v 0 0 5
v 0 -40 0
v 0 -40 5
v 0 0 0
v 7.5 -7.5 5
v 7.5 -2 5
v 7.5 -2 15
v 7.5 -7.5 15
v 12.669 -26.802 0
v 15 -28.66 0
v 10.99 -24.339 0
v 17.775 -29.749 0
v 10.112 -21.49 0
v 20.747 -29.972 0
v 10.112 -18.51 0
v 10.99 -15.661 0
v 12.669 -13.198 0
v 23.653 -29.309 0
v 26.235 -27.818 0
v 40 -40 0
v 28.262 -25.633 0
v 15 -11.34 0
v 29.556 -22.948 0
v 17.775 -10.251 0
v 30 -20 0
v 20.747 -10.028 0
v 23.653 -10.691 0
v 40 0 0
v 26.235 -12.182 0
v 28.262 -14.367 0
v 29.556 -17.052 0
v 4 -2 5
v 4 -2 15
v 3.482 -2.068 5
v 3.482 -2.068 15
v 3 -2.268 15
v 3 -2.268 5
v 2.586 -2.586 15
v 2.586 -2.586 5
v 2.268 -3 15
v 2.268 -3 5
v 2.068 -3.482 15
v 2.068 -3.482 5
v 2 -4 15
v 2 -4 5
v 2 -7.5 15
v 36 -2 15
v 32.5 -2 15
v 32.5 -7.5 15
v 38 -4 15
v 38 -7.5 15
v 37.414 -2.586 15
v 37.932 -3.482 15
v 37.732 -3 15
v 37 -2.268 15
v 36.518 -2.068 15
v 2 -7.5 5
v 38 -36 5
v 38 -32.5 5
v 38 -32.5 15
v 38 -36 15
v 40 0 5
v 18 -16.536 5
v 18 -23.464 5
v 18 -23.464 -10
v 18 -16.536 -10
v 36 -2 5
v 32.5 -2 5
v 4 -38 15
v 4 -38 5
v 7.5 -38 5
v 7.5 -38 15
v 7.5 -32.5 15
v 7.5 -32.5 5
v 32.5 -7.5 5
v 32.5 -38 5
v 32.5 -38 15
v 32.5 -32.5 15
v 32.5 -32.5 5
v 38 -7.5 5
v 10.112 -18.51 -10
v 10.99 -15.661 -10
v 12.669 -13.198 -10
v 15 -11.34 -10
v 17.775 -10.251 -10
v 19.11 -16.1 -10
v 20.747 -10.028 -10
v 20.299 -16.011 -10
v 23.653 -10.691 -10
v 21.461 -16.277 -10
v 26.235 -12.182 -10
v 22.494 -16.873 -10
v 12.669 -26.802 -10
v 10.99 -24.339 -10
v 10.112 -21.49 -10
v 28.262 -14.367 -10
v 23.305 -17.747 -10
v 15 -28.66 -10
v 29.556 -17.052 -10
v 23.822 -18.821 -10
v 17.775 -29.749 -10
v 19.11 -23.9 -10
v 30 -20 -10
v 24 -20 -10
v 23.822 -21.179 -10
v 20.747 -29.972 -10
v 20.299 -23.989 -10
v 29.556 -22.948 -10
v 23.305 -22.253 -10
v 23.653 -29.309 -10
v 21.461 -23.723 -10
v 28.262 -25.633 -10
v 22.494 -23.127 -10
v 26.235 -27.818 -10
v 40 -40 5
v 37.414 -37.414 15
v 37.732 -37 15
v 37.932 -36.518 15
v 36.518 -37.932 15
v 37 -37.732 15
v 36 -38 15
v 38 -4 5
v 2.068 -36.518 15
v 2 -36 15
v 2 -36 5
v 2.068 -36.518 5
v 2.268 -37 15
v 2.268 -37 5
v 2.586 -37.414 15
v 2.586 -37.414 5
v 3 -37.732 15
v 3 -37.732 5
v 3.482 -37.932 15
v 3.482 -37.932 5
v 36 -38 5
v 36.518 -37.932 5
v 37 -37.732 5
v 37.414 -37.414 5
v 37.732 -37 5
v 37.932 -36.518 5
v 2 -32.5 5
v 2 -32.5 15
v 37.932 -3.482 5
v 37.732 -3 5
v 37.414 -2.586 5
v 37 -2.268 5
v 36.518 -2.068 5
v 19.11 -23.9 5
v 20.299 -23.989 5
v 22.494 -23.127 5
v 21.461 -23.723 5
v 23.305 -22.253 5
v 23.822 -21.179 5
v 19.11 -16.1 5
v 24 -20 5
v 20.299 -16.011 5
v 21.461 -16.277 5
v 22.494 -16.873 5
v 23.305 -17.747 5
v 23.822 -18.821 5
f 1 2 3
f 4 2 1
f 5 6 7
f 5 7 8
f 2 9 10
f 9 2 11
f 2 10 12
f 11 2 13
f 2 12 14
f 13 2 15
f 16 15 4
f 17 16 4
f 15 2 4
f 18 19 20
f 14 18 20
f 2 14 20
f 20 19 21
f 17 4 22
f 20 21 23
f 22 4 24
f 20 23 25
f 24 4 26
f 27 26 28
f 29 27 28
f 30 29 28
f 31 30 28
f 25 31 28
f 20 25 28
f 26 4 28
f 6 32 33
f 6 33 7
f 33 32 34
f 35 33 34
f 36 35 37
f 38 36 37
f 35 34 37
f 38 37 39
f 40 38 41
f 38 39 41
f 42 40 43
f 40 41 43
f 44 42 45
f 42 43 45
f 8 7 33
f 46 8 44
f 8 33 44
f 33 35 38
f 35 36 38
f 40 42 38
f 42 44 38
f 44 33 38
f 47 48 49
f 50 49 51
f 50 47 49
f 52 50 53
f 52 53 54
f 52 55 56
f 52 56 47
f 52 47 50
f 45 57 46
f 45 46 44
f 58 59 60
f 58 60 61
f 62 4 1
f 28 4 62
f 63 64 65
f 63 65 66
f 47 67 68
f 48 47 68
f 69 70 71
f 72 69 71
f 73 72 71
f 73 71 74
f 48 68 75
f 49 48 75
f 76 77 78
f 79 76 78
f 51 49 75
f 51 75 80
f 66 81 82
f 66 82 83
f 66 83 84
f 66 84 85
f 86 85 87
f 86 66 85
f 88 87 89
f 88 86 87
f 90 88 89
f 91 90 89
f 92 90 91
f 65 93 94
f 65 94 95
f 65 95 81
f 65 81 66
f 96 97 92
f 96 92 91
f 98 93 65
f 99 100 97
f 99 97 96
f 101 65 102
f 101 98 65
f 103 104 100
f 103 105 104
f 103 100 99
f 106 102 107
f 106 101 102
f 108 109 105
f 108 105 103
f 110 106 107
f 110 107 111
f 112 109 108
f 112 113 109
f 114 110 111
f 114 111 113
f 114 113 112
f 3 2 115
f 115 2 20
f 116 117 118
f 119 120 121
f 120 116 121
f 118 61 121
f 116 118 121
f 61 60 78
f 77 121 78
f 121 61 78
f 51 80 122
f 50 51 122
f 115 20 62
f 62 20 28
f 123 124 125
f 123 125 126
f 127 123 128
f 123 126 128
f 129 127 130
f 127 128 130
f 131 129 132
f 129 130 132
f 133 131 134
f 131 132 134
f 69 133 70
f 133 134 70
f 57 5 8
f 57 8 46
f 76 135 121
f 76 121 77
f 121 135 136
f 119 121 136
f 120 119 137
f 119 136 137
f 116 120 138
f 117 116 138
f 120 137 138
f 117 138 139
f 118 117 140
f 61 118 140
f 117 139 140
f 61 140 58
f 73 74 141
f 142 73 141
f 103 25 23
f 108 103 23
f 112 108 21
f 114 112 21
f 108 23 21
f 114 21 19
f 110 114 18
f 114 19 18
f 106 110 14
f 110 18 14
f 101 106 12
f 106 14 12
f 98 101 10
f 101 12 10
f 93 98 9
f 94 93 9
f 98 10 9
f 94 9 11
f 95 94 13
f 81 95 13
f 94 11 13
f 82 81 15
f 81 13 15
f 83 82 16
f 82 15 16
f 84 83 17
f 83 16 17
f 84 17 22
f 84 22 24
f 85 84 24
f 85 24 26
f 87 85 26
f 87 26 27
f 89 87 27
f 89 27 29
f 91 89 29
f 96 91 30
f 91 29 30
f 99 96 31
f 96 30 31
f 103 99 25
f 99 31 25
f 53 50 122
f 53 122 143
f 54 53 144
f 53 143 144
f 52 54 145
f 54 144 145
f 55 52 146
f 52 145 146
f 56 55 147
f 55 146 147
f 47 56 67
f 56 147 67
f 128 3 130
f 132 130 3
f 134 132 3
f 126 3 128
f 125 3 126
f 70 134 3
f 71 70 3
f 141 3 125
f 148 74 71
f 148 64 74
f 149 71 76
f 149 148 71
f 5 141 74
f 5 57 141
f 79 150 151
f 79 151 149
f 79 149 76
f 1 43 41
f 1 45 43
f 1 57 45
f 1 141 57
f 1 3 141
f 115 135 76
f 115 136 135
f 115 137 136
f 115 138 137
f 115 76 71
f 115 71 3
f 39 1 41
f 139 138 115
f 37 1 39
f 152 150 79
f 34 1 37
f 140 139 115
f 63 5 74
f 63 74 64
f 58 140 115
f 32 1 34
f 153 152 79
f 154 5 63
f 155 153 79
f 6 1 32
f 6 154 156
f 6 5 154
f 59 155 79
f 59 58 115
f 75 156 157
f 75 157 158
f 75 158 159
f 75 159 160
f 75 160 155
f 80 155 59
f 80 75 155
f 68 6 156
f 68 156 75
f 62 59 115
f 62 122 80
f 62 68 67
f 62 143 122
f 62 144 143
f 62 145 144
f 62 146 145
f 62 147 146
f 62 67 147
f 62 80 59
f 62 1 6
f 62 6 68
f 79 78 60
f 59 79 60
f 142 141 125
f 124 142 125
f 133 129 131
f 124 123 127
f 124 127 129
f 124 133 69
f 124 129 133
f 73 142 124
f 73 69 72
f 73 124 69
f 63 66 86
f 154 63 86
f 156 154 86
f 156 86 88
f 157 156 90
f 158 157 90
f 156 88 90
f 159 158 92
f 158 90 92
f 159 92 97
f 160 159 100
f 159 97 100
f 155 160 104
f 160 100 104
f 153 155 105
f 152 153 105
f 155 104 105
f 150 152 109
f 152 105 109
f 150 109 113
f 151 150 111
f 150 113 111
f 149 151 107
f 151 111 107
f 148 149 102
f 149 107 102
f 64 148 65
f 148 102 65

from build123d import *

# Parameters (mm, degrees)
EXTRUDE002_DEPTH = 20
SKETCH003_R      = 10
EXTRUDE_DEPTH    = 10
SKETCH_W         = 40
SKETCH_H         = 40
PAD_DEPTH        = 5
PAD001_DEPTH     = 10


with BuildPart() as extrude002:
    # Sketch008 (on Face1 of CopyExtrude) → Extrude002 (new body)
    with BuildSketch(Plane(origin=(0, 0, -10), x_dir=(1, 0, 0), z_dir=(0, 0, -1))):
        with BuildLine():
            ThreePointArc((18, 16.535898), (24, 20), (18, 23.464102))
            Line((18, 23.464102), (18, 16.535898))
        make_face()
    extrude(amount=-EXTRUDE002_DEPTH)


with BuildPart() as valec:
    # Sketch003 → Extrude (new body)
    with BuildSketch(Plane(origin=(0, 0, 0), x_dir=(1, 0, 0), z_dir=(0, 0, -1))):
        with Locations((20, 20)):
            Circle(SKETCH003_R)
    extrude(amount=EXTRUDE_DEPTH)


with BuildPart() as koncovkaalprofilu:
    # Sketch → Pad (new body)
    with BuildSketch(Plane.XY):
        with Locations((20, -20)):
            Rectangle(SKETCH_W, SKETCH_H)
    extrude(amount=PAD_DEPTH)

    # Sketch001 (on Face6 of Pad) → Pad001 (join)
    with BuildSketch(Plane.XY.offset(5)):
        with BuildLine():
            Line((4, -2), (7.5, -2))
            Line((7.5, -2), (7.5, -7.5))
            Line((7.5, -7.5), (2, -7.5))
            Line((2, -7.5), (2, -4))
            ThreePointArc((4, -2), (2.585786, -2.585786), (2, -4))
        make_face()
        with BuildLine():
            Line((38, -7.5), (38, -4))
            ThreePointArc((38, -4), (37.414214, -2.585786), (36, -2))
            Line((36, -2), (32.5, -2))
            Line((32.5, -2), (32.5, -7.5))
            Line((32.5, -7.5), (38, -7.5))
        make_face()
        with BuildLine():
            Line((7.5, -32.5), (2, -32.5))
            Line((2, -32.5), (2, -36))
            ThreePointArc((2, -36), (2.585786, -37.414214), (4, -38))
            Line((4, -38), (7.5, -38))
            Line((7.5, -38), (7.5, -32.5))
        make_face()
        with BuildLine():
            Line((32.5, -38), (32.5, -32.5))
            Line((32.5, -32.5), (38, -32.5))
            Line((38, -32.5), (38, -36))
            ThreePointArc((36, -38), (37.414214, -37.414214), (38, -36))
            Line((36, -38), (32.5, -38))
        make_face()
    extrude(amount=PAD001_DEPTH)

    # Fusion: union Valec
    add(valec.part)

    # Cut: cut Extrude002
    add(extrude002.part, mode=Mode.SUBTRACT)


solid = koncovkaalprofilu.part
